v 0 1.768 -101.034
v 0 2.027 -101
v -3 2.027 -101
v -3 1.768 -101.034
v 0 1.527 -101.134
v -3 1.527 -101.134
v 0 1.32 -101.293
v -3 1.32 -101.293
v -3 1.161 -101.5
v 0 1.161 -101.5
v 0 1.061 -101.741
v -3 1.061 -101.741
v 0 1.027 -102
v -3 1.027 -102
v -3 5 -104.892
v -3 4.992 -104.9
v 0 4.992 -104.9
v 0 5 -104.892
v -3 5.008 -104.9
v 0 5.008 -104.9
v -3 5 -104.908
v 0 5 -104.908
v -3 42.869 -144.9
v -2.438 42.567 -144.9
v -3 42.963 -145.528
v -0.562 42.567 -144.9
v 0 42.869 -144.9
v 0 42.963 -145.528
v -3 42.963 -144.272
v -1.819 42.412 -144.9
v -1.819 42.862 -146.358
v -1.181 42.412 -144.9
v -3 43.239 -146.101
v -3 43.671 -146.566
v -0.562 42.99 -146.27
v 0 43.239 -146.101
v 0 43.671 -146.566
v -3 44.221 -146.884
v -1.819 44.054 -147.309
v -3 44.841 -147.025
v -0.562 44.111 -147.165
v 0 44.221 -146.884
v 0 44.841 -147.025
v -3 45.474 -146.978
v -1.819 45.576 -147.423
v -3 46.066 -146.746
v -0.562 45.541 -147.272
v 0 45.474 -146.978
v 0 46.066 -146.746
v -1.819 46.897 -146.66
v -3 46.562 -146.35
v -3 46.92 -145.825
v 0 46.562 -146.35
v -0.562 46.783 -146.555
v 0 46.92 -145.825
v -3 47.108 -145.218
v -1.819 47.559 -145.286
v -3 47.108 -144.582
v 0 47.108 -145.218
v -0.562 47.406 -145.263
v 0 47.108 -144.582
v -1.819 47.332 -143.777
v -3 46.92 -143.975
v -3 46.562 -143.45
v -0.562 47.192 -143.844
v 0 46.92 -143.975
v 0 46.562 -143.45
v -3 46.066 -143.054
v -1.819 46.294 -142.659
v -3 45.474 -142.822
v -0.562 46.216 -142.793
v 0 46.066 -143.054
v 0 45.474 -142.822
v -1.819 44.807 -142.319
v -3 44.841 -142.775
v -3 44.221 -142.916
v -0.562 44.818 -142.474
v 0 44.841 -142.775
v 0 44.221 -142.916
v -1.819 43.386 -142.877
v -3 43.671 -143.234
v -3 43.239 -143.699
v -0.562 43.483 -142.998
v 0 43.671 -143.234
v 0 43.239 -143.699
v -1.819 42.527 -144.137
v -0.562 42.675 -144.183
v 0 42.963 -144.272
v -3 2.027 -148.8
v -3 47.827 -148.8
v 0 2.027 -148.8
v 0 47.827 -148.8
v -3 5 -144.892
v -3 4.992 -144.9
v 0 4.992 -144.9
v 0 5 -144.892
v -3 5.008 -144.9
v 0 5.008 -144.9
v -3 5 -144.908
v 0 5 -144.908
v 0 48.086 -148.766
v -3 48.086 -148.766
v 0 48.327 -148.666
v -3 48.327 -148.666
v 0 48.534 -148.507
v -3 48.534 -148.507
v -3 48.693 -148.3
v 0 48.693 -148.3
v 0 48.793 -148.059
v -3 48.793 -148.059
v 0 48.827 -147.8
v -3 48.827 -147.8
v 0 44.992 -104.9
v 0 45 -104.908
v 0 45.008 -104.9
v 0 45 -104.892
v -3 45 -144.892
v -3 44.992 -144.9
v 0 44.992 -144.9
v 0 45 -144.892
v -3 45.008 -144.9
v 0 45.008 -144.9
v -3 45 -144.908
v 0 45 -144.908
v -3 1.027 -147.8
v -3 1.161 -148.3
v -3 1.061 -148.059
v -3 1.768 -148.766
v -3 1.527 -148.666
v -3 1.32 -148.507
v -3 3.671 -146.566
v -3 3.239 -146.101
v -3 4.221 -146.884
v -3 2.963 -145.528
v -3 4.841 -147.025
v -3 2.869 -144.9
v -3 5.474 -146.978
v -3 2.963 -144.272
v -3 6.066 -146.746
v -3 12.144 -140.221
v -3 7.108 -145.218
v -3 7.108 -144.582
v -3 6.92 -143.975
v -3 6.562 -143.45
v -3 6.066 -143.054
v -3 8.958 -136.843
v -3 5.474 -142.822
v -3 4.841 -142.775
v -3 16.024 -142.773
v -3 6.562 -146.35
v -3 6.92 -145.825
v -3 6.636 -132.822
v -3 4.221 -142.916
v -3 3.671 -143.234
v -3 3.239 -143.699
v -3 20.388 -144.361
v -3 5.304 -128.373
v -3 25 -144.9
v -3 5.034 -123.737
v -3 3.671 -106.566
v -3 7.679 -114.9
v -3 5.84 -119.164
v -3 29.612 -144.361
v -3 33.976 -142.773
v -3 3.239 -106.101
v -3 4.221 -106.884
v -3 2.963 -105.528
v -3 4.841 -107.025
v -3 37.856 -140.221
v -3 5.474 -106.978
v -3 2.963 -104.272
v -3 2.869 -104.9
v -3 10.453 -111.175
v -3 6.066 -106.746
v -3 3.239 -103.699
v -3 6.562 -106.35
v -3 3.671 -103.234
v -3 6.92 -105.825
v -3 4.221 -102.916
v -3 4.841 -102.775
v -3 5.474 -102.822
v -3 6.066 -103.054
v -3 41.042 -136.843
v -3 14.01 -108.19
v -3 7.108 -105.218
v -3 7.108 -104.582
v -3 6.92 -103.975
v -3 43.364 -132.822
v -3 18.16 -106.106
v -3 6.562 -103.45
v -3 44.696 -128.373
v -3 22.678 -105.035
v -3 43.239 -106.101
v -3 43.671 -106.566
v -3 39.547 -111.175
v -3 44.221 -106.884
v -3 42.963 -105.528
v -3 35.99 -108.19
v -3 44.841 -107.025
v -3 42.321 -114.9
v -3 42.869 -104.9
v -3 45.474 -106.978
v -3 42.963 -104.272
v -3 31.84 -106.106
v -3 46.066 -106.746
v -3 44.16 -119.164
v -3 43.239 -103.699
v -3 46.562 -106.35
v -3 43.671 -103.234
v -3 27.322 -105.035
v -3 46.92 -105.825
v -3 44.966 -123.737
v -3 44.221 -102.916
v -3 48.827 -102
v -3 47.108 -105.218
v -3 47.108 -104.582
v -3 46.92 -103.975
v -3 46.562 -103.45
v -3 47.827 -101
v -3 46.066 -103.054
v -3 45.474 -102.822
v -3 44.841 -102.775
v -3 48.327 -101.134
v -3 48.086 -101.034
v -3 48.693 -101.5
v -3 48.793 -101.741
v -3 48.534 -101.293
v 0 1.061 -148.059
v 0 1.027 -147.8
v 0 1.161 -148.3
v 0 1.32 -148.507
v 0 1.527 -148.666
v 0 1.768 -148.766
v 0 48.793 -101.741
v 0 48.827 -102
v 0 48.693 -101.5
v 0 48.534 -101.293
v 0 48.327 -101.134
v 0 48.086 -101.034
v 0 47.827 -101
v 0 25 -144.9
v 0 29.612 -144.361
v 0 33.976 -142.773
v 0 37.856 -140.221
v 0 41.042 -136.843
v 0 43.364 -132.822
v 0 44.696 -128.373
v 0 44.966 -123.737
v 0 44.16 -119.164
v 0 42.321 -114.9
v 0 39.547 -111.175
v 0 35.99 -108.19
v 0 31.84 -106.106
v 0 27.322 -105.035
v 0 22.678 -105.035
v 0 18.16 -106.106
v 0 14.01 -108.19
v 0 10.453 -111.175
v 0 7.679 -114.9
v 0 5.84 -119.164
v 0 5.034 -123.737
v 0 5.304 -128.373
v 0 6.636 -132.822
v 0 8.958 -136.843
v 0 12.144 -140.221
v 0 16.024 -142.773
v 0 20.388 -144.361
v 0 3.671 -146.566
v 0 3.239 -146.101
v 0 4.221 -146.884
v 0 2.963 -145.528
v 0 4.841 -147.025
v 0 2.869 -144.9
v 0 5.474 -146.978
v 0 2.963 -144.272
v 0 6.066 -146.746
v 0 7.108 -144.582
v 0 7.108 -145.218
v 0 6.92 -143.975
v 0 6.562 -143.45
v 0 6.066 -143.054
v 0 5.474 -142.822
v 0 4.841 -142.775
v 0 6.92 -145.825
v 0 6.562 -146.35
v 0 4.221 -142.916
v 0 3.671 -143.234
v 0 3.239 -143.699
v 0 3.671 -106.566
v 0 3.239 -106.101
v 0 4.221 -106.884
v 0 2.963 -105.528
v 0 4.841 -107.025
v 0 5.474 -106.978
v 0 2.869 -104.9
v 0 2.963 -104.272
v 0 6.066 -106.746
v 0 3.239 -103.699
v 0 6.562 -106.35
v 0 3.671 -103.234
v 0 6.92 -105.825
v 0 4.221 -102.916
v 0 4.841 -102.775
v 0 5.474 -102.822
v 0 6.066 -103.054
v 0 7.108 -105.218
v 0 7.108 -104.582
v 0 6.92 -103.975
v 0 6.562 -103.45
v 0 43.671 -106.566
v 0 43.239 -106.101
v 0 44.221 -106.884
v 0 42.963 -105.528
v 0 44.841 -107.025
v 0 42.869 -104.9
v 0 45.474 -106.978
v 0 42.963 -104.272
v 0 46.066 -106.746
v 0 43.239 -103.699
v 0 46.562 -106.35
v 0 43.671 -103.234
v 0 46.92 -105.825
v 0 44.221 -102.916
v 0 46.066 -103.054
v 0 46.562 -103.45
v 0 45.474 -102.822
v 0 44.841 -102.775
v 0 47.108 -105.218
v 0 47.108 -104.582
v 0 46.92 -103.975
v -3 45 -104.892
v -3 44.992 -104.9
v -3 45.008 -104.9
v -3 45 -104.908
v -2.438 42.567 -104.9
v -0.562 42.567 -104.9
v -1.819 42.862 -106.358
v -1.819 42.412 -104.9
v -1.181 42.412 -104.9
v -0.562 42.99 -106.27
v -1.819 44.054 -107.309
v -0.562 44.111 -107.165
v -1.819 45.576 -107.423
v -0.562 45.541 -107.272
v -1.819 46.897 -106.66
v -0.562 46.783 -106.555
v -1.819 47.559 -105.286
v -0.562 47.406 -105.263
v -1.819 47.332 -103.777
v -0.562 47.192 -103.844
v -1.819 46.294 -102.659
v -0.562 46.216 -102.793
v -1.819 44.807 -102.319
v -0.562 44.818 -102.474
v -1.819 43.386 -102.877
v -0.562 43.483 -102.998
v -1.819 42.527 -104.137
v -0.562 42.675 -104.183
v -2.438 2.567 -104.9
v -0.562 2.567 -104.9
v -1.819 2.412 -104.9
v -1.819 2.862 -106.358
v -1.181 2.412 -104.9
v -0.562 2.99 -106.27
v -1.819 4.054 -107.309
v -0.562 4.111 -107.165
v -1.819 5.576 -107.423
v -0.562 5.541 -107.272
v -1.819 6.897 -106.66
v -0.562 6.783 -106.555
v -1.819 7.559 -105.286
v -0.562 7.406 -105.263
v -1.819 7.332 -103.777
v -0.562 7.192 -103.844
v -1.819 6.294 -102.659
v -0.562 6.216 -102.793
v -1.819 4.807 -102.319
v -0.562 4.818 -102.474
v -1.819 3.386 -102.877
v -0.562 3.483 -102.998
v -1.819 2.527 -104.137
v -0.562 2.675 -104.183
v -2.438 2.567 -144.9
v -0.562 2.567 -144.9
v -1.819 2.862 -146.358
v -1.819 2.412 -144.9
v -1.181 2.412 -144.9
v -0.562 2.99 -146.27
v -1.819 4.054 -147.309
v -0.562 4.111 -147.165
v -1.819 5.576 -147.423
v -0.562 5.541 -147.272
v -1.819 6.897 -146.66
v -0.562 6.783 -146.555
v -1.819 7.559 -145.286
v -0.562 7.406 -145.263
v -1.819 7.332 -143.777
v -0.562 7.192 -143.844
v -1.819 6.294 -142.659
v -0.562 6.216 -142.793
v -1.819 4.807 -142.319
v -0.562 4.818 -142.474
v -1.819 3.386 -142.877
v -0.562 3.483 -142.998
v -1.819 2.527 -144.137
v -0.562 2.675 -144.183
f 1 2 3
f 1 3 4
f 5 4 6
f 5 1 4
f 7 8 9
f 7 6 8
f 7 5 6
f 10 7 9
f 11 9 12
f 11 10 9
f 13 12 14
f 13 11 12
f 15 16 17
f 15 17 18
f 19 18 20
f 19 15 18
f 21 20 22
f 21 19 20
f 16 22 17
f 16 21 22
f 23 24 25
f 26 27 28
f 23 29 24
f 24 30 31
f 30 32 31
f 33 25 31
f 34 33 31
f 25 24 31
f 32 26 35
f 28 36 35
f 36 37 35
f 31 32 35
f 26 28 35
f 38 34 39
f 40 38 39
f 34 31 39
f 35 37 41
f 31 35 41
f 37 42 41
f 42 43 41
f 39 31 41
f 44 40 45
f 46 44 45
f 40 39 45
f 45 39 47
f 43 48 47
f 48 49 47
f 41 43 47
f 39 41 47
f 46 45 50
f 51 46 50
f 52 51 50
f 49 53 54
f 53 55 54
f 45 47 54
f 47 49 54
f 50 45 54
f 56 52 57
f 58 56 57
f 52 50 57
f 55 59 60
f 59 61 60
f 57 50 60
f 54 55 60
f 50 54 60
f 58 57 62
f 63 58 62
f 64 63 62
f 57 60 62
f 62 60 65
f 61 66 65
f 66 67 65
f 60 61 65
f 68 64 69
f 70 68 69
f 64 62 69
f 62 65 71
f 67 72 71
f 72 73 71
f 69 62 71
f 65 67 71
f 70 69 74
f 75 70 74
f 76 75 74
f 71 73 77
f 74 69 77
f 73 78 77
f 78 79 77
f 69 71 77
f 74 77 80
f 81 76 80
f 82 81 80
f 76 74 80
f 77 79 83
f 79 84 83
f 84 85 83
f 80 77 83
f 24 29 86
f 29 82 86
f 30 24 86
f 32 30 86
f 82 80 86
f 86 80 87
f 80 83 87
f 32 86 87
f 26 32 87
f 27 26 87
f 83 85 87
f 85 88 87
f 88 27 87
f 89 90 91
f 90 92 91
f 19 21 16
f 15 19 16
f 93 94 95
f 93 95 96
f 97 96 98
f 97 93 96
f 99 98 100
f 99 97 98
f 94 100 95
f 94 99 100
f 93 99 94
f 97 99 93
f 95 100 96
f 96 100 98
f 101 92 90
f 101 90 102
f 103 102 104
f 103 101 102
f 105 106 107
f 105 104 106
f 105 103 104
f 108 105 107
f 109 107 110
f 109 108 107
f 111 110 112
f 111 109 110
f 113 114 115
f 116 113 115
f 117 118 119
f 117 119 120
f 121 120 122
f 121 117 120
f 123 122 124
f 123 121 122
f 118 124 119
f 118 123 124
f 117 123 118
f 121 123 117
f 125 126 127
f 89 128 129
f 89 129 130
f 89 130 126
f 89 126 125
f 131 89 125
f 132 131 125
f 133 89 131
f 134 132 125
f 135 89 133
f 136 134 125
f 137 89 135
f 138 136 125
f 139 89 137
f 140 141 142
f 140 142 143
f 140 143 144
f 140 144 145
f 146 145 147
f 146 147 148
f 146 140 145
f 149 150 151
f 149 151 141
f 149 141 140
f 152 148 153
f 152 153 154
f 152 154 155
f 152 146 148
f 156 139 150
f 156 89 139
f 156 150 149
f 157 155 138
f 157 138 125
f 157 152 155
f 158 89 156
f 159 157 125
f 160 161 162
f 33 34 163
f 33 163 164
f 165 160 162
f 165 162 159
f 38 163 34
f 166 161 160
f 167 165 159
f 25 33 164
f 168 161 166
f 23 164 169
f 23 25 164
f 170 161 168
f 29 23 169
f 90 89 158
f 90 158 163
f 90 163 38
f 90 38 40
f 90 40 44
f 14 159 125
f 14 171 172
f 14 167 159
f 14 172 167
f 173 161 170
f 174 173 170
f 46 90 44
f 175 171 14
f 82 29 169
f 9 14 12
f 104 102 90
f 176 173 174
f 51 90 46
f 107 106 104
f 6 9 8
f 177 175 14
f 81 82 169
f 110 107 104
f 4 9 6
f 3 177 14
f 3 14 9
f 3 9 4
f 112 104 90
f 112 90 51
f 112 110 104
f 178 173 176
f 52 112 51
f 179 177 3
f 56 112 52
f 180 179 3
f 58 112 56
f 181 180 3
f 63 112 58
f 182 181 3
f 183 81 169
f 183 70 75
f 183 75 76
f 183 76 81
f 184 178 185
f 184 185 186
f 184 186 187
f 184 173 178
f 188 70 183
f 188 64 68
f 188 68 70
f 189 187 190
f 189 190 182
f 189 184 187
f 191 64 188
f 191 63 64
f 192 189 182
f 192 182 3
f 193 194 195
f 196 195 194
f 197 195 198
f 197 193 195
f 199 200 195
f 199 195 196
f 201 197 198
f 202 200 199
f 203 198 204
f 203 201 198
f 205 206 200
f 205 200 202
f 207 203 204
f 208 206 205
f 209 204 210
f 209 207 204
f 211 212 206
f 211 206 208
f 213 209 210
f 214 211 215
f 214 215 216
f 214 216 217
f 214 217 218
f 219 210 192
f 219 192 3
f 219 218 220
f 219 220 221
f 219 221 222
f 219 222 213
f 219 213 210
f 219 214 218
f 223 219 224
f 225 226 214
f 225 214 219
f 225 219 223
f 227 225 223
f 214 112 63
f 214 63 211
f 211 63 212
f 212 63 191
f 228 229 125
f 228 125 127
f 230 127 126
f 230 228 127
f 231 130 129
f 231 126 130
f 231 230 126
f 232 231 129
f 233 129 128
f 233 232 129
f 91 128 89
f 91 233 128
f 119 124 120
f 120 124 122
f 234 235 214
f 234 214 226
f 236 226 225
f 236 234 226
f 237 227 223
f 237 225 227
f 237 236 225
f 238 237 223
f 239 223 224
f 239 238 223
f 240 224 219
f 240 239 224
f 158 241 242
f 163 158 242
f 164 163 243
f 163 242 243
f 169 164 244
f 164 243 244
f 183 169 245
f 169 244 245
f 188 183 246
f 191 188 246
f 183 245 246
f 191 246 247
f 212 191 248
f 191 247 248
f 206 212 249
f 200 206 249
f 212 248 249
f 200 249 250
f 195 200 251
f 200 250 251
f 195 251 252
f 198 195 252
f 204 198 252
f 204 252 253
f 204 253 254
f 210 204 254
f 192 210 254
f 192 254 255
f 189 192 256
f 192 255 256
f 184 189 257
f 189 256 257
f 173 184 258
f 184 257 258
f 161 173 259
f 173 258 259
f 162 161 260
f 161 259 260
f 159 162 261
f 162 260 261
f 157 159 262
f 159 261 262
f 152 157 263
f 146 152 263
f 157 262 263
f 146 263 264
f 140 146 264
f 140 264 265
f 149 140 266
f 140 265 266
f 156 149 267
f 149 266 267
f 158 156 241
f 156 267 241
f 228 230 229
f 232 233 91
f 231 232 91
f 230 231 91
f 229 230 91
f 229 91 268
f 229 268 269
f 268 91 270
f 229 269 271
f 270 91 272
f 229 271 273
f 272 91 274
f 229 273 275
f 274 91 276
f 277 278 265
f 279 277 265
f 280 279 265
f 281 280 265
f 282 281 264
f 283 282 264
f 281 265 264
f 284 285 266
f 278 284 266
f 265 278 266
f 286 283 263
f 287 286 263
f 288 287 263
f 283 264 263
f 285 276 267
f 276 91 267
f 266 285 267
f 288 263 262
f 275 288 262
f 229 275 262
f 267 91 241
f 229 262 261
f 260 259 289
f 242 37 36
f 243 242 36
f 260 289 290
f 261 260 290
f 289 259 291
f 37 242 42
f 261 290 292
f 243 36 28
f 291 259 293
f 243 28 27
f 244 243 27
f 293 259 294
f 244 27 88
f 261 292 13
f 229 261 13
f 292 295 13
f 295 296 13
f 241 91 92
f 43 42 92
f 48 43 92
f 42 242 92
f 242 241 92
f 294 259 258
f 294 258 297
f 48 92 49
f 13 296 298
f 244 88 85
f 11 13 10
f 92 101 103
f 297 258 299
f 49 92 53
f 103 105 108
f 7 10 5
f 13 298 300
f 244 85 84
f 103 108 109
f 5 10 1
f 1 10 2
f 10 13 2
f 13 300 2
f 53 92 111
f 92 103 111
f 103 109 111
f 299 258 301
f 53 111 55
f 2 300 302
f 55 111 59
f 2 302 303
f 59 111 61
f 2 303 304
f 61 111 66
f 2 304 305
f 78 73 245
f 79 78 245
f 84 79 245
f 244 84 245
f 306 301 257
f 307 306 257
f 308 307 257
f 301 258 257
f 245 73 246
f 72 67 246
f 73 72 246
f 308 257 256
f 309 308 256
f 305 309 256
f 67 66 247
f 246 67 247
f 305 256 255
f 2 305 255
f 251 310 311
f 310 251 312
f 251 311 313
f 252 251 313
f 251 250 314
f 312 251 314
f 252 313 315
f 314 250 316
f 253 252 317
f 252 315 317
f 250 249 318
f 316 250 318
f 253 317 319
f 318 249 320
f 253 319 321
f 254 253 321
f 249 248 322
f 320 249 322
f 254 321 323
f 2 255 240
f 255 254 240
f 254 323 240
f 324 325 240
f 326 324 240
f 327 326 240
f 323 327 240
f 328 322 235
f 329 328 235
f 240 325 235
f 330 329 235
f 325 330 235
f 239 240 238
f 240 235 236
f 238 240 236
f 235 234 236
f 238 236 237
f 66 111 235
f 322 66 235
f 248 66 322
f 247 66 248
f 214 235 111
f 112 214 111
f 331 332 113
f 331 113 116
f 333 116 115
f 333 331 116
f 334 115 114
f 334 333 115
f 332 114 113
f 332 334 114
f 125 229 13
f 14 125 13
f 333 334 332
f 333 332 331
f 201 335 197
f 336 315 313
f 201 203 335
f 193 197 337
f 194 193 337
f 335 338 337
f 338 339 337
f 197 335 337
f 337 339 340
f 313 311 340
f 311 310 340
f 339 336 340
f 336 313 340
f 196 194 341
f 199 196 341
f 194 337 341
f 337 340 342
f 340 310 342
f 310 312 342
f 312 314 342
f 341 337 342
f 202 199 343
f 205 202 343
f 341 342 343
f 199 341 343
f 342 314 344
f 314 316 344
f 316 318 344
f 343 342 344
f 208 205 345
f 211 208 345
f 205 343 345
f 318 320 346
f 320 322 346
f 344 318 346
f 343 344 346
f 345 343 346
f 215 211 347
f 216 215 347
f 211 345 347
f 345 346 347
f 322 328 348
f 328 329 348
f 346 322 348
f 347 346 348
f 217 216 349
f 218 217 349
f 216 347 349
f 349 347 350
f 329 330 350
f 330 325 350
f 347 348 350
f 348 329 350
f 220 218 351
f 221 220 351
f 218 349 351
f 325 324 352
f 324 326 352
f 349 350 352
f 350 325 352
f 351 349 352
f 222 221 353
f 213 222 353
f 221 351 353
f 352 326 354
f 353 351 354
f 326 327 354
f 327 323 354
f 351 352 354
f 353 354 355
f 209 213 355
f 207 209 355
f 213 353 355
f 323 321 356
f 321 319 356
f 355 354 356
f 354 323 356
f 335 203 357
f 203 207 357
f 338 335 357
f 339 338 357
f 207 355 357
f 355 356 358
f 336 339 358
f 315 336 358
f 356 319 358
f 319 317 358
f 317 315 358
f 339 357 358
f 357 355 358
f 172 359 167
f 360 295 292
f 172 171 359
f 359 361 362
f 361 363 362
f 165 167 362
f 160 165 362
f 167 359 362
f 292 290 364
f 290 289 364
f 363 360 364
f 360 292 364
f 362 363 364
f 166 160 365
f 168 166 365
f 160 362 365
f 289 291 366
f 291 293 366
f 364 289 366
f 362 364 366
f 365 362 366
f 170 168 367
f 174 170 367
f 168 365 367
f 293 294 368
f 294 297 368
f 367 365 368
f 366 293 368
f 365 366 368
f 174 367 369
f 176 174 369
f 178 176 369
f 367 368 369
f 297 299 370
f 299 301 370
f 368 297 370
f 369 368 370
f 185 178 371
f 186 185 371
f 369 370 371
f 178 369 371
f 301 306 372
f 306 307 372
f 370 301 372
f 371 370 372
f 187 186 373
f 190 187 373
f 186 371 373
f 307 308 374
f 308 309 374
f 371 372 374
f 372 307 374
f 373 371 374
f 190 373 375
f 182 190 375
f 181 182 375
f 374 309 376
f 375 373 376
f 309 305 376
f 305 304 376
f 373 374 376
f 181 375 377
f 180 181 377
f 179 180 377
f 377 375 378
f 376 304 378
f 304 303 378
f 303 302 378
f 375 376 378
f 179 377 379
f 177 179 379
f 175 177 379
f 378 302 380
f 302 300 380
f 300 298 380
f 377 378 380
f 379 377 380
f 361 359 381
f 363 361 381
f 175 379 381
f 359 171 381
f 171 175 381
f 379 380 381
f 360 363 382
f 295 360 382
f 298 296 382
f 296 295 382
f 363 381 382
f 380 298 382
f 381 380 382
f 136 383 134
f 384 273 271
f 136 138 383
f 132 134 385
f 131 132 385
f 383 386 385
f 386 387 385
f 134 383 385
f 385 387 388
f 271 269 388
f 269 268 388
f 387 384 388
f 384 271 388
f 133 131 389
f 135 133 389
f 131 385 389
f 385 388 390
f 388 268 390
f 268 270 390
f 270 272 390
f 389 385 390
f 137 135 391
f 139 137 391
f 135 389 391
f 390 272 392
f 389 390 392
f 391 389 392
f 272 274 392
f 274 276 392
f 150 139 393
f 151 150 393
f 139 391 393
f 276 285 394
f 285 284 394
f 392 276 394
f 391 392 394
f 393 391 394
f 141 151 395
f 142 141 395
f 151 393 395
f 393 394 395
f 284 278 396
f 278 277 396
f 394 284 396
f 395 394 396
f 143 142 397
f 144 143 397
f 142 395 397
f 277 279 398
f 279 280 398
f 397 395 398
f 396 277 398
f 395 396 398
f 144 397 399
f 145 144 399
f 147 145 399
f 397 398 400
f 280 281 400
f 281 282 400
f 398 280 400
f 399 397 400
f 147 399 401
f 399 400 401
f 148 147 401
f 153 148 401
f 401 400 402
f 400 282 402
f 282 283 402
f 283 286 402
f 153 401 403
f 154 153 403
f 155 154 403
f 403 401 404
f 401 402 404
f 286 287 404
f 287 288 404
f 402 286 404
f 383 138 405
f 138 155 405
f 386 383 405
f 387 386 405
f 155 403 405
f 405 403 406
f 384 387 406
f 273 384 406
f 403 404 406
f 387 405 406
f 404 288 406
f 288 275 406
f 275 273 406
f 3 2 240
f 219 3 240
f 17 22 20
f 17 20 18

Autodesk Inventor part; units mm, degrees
ref_plane "YZ Plane" through (0, 0, 0) normal (1, 0, 0) x (0, 1, 0)
ref_plane "XZ Plane" through (0, 0, 0) normal (0, 1, 0) x (-1, 0, 0)
ref_plane "XY Plane" through (0, 0, 0) normal (0, 0, 1) x (1, 0, 0)
ref_plane "Arbeitsebene1" through (0, 0, -149.8) normal (-1, 0, 0) x (0, 0, 1)
sketch "Skizze1" plane through (0, 0, -149.8) normal (-1, 0, 0) x (0, 0, 1)
  circle A0 centre (44.9, 5) radius 1.5 construction
  circle A1 centre (4.9, 5) radius 1.5 construction
  circle A2 centre (4.9, 45) radius 1.6 construction
  circle A3 centre (44.9, 45) radius 1.6 construction
  line L0 (39.5269, 16.1776) -> (39.5269, 39.7) construction
  line L1 (16.0815, 10.3) -> (33.7185, 10.3) construction
  line L2 (10.2731, 16.1776) -> (10.2731, 39.7) construction
  circle A4 centre (24.9, 24.9269) radius 14.6269 construction
  line L3 (2, 49.8269) -> (47.8, 49.8269)
  line L4 (49.8, 47.8269) -> (49.8, 2.0269)
  line L5 (47.8, 0.0269) -> (2, 0.0269)
  line L6 (0, 2.0269) -> (0, 47.8269)
  line L7 (0, 49.8269) -> (49.8, 0.0269) construction
  line L8 (49.8, 49.8269) -> (0, 0.0269) construction
  arc A5 (47.8, 0.0269) -> (49.8, 2.0269) centre (47.8, 2.0269) ccw
  arc A6 (0, 2.0269) -> (2, 0.0269) centre (2, 2.0269) ccw
  arc A7 (2, 49.8269) -> (0, 47.8269) centre (2, 47.8269) ccw
  arc A8 (49.8, 47.8269) -> (47.8, 49.8269) centre (47.8, 47.8269) ccw
  line L9 (2, 1.0269) -> (47.8, 1.0269)
  arc A9 (47.8, 1.0269) -> (48.8, 2.0269) centre (47.8, 2.0269) ccw
  line L10 (48.8, 2.0269) -> (48.8, 47.8269)
  arc A10 (48.8, 47.8269) -> (47.8, 48.8269) centre (47.8, 47.8269) ccw
  line L11 (47.8, 48.8269) -> (2, 48.8269)
  arc A11 (2, 48.8269) -> (1, 47.8269) centre (2, 47.8269) ccw
  line L12 (1, 47.8269) -> (1, 2.0269)
  arc A12 (1, 2.0269) -> (2, 1.0269) centre (2, 2.0269) ccw
  point P0 (149.8, 0)
extrude "Extrusion1" add sketch "Skizze1" along normal blind 3 contours A12 L12 A11 L11 A10 L10 A9 L9
ref_plane "Arbeitsebene2" through (0, 5, -104.9) normal (0, 0, 1) x (1, 0, 0)
sketch "Skizze2" plane through (0, 5, -104.9) normal (0, 0, 1) x (1, 0, 0)
  line L0 (0, 5.3) -> (7, 5.3) projected
  line L1 (0, 8.3139) -> (7.3731, 8.3139)
  line L2 (0, -2.9731) -> (0, 42.8269) projected
  line L3 (0, 6.807) -> (-3, 6.807)
  line L4 (-3, -2.9731) -> (-3, 42.8269) projected
  circle A0 centre (-1.5, 6.807) radius 2.6
  line L5 (1.1, 6.807) -> (-4.1, 6.807)
  line L6 (0, 1.6861) -> (7.3731, 1.6861)
  line L7 (2.4, -2.5) -> (8, -2.5) projected
  line L8 (15, -1.5) -> (6.4, -1.5)
  line L9 (10.2731, 1.5) -> (6.4, 1.5)
  line L10 (0, -0.0077) -> (-3, -0.0077)
  circle A1 centre (-1.5, -0.0077) radius 2.6
  line L11 (1.1, -0.0077) -> (-4.1, -0.0077)
  line L12 (-7.92, 0) -> (18.82, 0) projected
  point P0 (0, -5)
  point P1 (0, 1.4993)
  dimension "d6" = 1.507
  dimension "d7" = 5.2
  dimension "d9" = 5.2
revolve "Umdrehung2" cut sketch "Skizze2" angle 360 about axis through (47.3, 5, -104.9) along (1, 0, 0) contours L11 A1 L2 | L2 A1 L4 L10 | L4 A1 L11
pattern_linear "Rechteckige Anordnung1" count 2 spacing 40 along (0, 1, 0) count 2 spacing 40 along (0, 0, -1) of "Umdrehung2"
sketch "Skizze3" plane through (0, 0, -149.8) normal (1, 0, 0) x (0, 0, -1)
  point P0 (-149.8, 0)
sketch "Skizze4" plane through (0, 0, -149.8) normal (1, 0, 0) x (0, 0, -1)
  circle A0 centre (-24.9, 25) radius 11.45
  circle A1 centre (-24.9, 25) radius 20
  point P0 (-149.8, 0)
  dimension "d21" = 40
extrude "Extrusion2" cut sketch "Skizze4" against normal blind 10 contours A0 | A1
properties part number "30_Adapterplate_Eyepiece"
